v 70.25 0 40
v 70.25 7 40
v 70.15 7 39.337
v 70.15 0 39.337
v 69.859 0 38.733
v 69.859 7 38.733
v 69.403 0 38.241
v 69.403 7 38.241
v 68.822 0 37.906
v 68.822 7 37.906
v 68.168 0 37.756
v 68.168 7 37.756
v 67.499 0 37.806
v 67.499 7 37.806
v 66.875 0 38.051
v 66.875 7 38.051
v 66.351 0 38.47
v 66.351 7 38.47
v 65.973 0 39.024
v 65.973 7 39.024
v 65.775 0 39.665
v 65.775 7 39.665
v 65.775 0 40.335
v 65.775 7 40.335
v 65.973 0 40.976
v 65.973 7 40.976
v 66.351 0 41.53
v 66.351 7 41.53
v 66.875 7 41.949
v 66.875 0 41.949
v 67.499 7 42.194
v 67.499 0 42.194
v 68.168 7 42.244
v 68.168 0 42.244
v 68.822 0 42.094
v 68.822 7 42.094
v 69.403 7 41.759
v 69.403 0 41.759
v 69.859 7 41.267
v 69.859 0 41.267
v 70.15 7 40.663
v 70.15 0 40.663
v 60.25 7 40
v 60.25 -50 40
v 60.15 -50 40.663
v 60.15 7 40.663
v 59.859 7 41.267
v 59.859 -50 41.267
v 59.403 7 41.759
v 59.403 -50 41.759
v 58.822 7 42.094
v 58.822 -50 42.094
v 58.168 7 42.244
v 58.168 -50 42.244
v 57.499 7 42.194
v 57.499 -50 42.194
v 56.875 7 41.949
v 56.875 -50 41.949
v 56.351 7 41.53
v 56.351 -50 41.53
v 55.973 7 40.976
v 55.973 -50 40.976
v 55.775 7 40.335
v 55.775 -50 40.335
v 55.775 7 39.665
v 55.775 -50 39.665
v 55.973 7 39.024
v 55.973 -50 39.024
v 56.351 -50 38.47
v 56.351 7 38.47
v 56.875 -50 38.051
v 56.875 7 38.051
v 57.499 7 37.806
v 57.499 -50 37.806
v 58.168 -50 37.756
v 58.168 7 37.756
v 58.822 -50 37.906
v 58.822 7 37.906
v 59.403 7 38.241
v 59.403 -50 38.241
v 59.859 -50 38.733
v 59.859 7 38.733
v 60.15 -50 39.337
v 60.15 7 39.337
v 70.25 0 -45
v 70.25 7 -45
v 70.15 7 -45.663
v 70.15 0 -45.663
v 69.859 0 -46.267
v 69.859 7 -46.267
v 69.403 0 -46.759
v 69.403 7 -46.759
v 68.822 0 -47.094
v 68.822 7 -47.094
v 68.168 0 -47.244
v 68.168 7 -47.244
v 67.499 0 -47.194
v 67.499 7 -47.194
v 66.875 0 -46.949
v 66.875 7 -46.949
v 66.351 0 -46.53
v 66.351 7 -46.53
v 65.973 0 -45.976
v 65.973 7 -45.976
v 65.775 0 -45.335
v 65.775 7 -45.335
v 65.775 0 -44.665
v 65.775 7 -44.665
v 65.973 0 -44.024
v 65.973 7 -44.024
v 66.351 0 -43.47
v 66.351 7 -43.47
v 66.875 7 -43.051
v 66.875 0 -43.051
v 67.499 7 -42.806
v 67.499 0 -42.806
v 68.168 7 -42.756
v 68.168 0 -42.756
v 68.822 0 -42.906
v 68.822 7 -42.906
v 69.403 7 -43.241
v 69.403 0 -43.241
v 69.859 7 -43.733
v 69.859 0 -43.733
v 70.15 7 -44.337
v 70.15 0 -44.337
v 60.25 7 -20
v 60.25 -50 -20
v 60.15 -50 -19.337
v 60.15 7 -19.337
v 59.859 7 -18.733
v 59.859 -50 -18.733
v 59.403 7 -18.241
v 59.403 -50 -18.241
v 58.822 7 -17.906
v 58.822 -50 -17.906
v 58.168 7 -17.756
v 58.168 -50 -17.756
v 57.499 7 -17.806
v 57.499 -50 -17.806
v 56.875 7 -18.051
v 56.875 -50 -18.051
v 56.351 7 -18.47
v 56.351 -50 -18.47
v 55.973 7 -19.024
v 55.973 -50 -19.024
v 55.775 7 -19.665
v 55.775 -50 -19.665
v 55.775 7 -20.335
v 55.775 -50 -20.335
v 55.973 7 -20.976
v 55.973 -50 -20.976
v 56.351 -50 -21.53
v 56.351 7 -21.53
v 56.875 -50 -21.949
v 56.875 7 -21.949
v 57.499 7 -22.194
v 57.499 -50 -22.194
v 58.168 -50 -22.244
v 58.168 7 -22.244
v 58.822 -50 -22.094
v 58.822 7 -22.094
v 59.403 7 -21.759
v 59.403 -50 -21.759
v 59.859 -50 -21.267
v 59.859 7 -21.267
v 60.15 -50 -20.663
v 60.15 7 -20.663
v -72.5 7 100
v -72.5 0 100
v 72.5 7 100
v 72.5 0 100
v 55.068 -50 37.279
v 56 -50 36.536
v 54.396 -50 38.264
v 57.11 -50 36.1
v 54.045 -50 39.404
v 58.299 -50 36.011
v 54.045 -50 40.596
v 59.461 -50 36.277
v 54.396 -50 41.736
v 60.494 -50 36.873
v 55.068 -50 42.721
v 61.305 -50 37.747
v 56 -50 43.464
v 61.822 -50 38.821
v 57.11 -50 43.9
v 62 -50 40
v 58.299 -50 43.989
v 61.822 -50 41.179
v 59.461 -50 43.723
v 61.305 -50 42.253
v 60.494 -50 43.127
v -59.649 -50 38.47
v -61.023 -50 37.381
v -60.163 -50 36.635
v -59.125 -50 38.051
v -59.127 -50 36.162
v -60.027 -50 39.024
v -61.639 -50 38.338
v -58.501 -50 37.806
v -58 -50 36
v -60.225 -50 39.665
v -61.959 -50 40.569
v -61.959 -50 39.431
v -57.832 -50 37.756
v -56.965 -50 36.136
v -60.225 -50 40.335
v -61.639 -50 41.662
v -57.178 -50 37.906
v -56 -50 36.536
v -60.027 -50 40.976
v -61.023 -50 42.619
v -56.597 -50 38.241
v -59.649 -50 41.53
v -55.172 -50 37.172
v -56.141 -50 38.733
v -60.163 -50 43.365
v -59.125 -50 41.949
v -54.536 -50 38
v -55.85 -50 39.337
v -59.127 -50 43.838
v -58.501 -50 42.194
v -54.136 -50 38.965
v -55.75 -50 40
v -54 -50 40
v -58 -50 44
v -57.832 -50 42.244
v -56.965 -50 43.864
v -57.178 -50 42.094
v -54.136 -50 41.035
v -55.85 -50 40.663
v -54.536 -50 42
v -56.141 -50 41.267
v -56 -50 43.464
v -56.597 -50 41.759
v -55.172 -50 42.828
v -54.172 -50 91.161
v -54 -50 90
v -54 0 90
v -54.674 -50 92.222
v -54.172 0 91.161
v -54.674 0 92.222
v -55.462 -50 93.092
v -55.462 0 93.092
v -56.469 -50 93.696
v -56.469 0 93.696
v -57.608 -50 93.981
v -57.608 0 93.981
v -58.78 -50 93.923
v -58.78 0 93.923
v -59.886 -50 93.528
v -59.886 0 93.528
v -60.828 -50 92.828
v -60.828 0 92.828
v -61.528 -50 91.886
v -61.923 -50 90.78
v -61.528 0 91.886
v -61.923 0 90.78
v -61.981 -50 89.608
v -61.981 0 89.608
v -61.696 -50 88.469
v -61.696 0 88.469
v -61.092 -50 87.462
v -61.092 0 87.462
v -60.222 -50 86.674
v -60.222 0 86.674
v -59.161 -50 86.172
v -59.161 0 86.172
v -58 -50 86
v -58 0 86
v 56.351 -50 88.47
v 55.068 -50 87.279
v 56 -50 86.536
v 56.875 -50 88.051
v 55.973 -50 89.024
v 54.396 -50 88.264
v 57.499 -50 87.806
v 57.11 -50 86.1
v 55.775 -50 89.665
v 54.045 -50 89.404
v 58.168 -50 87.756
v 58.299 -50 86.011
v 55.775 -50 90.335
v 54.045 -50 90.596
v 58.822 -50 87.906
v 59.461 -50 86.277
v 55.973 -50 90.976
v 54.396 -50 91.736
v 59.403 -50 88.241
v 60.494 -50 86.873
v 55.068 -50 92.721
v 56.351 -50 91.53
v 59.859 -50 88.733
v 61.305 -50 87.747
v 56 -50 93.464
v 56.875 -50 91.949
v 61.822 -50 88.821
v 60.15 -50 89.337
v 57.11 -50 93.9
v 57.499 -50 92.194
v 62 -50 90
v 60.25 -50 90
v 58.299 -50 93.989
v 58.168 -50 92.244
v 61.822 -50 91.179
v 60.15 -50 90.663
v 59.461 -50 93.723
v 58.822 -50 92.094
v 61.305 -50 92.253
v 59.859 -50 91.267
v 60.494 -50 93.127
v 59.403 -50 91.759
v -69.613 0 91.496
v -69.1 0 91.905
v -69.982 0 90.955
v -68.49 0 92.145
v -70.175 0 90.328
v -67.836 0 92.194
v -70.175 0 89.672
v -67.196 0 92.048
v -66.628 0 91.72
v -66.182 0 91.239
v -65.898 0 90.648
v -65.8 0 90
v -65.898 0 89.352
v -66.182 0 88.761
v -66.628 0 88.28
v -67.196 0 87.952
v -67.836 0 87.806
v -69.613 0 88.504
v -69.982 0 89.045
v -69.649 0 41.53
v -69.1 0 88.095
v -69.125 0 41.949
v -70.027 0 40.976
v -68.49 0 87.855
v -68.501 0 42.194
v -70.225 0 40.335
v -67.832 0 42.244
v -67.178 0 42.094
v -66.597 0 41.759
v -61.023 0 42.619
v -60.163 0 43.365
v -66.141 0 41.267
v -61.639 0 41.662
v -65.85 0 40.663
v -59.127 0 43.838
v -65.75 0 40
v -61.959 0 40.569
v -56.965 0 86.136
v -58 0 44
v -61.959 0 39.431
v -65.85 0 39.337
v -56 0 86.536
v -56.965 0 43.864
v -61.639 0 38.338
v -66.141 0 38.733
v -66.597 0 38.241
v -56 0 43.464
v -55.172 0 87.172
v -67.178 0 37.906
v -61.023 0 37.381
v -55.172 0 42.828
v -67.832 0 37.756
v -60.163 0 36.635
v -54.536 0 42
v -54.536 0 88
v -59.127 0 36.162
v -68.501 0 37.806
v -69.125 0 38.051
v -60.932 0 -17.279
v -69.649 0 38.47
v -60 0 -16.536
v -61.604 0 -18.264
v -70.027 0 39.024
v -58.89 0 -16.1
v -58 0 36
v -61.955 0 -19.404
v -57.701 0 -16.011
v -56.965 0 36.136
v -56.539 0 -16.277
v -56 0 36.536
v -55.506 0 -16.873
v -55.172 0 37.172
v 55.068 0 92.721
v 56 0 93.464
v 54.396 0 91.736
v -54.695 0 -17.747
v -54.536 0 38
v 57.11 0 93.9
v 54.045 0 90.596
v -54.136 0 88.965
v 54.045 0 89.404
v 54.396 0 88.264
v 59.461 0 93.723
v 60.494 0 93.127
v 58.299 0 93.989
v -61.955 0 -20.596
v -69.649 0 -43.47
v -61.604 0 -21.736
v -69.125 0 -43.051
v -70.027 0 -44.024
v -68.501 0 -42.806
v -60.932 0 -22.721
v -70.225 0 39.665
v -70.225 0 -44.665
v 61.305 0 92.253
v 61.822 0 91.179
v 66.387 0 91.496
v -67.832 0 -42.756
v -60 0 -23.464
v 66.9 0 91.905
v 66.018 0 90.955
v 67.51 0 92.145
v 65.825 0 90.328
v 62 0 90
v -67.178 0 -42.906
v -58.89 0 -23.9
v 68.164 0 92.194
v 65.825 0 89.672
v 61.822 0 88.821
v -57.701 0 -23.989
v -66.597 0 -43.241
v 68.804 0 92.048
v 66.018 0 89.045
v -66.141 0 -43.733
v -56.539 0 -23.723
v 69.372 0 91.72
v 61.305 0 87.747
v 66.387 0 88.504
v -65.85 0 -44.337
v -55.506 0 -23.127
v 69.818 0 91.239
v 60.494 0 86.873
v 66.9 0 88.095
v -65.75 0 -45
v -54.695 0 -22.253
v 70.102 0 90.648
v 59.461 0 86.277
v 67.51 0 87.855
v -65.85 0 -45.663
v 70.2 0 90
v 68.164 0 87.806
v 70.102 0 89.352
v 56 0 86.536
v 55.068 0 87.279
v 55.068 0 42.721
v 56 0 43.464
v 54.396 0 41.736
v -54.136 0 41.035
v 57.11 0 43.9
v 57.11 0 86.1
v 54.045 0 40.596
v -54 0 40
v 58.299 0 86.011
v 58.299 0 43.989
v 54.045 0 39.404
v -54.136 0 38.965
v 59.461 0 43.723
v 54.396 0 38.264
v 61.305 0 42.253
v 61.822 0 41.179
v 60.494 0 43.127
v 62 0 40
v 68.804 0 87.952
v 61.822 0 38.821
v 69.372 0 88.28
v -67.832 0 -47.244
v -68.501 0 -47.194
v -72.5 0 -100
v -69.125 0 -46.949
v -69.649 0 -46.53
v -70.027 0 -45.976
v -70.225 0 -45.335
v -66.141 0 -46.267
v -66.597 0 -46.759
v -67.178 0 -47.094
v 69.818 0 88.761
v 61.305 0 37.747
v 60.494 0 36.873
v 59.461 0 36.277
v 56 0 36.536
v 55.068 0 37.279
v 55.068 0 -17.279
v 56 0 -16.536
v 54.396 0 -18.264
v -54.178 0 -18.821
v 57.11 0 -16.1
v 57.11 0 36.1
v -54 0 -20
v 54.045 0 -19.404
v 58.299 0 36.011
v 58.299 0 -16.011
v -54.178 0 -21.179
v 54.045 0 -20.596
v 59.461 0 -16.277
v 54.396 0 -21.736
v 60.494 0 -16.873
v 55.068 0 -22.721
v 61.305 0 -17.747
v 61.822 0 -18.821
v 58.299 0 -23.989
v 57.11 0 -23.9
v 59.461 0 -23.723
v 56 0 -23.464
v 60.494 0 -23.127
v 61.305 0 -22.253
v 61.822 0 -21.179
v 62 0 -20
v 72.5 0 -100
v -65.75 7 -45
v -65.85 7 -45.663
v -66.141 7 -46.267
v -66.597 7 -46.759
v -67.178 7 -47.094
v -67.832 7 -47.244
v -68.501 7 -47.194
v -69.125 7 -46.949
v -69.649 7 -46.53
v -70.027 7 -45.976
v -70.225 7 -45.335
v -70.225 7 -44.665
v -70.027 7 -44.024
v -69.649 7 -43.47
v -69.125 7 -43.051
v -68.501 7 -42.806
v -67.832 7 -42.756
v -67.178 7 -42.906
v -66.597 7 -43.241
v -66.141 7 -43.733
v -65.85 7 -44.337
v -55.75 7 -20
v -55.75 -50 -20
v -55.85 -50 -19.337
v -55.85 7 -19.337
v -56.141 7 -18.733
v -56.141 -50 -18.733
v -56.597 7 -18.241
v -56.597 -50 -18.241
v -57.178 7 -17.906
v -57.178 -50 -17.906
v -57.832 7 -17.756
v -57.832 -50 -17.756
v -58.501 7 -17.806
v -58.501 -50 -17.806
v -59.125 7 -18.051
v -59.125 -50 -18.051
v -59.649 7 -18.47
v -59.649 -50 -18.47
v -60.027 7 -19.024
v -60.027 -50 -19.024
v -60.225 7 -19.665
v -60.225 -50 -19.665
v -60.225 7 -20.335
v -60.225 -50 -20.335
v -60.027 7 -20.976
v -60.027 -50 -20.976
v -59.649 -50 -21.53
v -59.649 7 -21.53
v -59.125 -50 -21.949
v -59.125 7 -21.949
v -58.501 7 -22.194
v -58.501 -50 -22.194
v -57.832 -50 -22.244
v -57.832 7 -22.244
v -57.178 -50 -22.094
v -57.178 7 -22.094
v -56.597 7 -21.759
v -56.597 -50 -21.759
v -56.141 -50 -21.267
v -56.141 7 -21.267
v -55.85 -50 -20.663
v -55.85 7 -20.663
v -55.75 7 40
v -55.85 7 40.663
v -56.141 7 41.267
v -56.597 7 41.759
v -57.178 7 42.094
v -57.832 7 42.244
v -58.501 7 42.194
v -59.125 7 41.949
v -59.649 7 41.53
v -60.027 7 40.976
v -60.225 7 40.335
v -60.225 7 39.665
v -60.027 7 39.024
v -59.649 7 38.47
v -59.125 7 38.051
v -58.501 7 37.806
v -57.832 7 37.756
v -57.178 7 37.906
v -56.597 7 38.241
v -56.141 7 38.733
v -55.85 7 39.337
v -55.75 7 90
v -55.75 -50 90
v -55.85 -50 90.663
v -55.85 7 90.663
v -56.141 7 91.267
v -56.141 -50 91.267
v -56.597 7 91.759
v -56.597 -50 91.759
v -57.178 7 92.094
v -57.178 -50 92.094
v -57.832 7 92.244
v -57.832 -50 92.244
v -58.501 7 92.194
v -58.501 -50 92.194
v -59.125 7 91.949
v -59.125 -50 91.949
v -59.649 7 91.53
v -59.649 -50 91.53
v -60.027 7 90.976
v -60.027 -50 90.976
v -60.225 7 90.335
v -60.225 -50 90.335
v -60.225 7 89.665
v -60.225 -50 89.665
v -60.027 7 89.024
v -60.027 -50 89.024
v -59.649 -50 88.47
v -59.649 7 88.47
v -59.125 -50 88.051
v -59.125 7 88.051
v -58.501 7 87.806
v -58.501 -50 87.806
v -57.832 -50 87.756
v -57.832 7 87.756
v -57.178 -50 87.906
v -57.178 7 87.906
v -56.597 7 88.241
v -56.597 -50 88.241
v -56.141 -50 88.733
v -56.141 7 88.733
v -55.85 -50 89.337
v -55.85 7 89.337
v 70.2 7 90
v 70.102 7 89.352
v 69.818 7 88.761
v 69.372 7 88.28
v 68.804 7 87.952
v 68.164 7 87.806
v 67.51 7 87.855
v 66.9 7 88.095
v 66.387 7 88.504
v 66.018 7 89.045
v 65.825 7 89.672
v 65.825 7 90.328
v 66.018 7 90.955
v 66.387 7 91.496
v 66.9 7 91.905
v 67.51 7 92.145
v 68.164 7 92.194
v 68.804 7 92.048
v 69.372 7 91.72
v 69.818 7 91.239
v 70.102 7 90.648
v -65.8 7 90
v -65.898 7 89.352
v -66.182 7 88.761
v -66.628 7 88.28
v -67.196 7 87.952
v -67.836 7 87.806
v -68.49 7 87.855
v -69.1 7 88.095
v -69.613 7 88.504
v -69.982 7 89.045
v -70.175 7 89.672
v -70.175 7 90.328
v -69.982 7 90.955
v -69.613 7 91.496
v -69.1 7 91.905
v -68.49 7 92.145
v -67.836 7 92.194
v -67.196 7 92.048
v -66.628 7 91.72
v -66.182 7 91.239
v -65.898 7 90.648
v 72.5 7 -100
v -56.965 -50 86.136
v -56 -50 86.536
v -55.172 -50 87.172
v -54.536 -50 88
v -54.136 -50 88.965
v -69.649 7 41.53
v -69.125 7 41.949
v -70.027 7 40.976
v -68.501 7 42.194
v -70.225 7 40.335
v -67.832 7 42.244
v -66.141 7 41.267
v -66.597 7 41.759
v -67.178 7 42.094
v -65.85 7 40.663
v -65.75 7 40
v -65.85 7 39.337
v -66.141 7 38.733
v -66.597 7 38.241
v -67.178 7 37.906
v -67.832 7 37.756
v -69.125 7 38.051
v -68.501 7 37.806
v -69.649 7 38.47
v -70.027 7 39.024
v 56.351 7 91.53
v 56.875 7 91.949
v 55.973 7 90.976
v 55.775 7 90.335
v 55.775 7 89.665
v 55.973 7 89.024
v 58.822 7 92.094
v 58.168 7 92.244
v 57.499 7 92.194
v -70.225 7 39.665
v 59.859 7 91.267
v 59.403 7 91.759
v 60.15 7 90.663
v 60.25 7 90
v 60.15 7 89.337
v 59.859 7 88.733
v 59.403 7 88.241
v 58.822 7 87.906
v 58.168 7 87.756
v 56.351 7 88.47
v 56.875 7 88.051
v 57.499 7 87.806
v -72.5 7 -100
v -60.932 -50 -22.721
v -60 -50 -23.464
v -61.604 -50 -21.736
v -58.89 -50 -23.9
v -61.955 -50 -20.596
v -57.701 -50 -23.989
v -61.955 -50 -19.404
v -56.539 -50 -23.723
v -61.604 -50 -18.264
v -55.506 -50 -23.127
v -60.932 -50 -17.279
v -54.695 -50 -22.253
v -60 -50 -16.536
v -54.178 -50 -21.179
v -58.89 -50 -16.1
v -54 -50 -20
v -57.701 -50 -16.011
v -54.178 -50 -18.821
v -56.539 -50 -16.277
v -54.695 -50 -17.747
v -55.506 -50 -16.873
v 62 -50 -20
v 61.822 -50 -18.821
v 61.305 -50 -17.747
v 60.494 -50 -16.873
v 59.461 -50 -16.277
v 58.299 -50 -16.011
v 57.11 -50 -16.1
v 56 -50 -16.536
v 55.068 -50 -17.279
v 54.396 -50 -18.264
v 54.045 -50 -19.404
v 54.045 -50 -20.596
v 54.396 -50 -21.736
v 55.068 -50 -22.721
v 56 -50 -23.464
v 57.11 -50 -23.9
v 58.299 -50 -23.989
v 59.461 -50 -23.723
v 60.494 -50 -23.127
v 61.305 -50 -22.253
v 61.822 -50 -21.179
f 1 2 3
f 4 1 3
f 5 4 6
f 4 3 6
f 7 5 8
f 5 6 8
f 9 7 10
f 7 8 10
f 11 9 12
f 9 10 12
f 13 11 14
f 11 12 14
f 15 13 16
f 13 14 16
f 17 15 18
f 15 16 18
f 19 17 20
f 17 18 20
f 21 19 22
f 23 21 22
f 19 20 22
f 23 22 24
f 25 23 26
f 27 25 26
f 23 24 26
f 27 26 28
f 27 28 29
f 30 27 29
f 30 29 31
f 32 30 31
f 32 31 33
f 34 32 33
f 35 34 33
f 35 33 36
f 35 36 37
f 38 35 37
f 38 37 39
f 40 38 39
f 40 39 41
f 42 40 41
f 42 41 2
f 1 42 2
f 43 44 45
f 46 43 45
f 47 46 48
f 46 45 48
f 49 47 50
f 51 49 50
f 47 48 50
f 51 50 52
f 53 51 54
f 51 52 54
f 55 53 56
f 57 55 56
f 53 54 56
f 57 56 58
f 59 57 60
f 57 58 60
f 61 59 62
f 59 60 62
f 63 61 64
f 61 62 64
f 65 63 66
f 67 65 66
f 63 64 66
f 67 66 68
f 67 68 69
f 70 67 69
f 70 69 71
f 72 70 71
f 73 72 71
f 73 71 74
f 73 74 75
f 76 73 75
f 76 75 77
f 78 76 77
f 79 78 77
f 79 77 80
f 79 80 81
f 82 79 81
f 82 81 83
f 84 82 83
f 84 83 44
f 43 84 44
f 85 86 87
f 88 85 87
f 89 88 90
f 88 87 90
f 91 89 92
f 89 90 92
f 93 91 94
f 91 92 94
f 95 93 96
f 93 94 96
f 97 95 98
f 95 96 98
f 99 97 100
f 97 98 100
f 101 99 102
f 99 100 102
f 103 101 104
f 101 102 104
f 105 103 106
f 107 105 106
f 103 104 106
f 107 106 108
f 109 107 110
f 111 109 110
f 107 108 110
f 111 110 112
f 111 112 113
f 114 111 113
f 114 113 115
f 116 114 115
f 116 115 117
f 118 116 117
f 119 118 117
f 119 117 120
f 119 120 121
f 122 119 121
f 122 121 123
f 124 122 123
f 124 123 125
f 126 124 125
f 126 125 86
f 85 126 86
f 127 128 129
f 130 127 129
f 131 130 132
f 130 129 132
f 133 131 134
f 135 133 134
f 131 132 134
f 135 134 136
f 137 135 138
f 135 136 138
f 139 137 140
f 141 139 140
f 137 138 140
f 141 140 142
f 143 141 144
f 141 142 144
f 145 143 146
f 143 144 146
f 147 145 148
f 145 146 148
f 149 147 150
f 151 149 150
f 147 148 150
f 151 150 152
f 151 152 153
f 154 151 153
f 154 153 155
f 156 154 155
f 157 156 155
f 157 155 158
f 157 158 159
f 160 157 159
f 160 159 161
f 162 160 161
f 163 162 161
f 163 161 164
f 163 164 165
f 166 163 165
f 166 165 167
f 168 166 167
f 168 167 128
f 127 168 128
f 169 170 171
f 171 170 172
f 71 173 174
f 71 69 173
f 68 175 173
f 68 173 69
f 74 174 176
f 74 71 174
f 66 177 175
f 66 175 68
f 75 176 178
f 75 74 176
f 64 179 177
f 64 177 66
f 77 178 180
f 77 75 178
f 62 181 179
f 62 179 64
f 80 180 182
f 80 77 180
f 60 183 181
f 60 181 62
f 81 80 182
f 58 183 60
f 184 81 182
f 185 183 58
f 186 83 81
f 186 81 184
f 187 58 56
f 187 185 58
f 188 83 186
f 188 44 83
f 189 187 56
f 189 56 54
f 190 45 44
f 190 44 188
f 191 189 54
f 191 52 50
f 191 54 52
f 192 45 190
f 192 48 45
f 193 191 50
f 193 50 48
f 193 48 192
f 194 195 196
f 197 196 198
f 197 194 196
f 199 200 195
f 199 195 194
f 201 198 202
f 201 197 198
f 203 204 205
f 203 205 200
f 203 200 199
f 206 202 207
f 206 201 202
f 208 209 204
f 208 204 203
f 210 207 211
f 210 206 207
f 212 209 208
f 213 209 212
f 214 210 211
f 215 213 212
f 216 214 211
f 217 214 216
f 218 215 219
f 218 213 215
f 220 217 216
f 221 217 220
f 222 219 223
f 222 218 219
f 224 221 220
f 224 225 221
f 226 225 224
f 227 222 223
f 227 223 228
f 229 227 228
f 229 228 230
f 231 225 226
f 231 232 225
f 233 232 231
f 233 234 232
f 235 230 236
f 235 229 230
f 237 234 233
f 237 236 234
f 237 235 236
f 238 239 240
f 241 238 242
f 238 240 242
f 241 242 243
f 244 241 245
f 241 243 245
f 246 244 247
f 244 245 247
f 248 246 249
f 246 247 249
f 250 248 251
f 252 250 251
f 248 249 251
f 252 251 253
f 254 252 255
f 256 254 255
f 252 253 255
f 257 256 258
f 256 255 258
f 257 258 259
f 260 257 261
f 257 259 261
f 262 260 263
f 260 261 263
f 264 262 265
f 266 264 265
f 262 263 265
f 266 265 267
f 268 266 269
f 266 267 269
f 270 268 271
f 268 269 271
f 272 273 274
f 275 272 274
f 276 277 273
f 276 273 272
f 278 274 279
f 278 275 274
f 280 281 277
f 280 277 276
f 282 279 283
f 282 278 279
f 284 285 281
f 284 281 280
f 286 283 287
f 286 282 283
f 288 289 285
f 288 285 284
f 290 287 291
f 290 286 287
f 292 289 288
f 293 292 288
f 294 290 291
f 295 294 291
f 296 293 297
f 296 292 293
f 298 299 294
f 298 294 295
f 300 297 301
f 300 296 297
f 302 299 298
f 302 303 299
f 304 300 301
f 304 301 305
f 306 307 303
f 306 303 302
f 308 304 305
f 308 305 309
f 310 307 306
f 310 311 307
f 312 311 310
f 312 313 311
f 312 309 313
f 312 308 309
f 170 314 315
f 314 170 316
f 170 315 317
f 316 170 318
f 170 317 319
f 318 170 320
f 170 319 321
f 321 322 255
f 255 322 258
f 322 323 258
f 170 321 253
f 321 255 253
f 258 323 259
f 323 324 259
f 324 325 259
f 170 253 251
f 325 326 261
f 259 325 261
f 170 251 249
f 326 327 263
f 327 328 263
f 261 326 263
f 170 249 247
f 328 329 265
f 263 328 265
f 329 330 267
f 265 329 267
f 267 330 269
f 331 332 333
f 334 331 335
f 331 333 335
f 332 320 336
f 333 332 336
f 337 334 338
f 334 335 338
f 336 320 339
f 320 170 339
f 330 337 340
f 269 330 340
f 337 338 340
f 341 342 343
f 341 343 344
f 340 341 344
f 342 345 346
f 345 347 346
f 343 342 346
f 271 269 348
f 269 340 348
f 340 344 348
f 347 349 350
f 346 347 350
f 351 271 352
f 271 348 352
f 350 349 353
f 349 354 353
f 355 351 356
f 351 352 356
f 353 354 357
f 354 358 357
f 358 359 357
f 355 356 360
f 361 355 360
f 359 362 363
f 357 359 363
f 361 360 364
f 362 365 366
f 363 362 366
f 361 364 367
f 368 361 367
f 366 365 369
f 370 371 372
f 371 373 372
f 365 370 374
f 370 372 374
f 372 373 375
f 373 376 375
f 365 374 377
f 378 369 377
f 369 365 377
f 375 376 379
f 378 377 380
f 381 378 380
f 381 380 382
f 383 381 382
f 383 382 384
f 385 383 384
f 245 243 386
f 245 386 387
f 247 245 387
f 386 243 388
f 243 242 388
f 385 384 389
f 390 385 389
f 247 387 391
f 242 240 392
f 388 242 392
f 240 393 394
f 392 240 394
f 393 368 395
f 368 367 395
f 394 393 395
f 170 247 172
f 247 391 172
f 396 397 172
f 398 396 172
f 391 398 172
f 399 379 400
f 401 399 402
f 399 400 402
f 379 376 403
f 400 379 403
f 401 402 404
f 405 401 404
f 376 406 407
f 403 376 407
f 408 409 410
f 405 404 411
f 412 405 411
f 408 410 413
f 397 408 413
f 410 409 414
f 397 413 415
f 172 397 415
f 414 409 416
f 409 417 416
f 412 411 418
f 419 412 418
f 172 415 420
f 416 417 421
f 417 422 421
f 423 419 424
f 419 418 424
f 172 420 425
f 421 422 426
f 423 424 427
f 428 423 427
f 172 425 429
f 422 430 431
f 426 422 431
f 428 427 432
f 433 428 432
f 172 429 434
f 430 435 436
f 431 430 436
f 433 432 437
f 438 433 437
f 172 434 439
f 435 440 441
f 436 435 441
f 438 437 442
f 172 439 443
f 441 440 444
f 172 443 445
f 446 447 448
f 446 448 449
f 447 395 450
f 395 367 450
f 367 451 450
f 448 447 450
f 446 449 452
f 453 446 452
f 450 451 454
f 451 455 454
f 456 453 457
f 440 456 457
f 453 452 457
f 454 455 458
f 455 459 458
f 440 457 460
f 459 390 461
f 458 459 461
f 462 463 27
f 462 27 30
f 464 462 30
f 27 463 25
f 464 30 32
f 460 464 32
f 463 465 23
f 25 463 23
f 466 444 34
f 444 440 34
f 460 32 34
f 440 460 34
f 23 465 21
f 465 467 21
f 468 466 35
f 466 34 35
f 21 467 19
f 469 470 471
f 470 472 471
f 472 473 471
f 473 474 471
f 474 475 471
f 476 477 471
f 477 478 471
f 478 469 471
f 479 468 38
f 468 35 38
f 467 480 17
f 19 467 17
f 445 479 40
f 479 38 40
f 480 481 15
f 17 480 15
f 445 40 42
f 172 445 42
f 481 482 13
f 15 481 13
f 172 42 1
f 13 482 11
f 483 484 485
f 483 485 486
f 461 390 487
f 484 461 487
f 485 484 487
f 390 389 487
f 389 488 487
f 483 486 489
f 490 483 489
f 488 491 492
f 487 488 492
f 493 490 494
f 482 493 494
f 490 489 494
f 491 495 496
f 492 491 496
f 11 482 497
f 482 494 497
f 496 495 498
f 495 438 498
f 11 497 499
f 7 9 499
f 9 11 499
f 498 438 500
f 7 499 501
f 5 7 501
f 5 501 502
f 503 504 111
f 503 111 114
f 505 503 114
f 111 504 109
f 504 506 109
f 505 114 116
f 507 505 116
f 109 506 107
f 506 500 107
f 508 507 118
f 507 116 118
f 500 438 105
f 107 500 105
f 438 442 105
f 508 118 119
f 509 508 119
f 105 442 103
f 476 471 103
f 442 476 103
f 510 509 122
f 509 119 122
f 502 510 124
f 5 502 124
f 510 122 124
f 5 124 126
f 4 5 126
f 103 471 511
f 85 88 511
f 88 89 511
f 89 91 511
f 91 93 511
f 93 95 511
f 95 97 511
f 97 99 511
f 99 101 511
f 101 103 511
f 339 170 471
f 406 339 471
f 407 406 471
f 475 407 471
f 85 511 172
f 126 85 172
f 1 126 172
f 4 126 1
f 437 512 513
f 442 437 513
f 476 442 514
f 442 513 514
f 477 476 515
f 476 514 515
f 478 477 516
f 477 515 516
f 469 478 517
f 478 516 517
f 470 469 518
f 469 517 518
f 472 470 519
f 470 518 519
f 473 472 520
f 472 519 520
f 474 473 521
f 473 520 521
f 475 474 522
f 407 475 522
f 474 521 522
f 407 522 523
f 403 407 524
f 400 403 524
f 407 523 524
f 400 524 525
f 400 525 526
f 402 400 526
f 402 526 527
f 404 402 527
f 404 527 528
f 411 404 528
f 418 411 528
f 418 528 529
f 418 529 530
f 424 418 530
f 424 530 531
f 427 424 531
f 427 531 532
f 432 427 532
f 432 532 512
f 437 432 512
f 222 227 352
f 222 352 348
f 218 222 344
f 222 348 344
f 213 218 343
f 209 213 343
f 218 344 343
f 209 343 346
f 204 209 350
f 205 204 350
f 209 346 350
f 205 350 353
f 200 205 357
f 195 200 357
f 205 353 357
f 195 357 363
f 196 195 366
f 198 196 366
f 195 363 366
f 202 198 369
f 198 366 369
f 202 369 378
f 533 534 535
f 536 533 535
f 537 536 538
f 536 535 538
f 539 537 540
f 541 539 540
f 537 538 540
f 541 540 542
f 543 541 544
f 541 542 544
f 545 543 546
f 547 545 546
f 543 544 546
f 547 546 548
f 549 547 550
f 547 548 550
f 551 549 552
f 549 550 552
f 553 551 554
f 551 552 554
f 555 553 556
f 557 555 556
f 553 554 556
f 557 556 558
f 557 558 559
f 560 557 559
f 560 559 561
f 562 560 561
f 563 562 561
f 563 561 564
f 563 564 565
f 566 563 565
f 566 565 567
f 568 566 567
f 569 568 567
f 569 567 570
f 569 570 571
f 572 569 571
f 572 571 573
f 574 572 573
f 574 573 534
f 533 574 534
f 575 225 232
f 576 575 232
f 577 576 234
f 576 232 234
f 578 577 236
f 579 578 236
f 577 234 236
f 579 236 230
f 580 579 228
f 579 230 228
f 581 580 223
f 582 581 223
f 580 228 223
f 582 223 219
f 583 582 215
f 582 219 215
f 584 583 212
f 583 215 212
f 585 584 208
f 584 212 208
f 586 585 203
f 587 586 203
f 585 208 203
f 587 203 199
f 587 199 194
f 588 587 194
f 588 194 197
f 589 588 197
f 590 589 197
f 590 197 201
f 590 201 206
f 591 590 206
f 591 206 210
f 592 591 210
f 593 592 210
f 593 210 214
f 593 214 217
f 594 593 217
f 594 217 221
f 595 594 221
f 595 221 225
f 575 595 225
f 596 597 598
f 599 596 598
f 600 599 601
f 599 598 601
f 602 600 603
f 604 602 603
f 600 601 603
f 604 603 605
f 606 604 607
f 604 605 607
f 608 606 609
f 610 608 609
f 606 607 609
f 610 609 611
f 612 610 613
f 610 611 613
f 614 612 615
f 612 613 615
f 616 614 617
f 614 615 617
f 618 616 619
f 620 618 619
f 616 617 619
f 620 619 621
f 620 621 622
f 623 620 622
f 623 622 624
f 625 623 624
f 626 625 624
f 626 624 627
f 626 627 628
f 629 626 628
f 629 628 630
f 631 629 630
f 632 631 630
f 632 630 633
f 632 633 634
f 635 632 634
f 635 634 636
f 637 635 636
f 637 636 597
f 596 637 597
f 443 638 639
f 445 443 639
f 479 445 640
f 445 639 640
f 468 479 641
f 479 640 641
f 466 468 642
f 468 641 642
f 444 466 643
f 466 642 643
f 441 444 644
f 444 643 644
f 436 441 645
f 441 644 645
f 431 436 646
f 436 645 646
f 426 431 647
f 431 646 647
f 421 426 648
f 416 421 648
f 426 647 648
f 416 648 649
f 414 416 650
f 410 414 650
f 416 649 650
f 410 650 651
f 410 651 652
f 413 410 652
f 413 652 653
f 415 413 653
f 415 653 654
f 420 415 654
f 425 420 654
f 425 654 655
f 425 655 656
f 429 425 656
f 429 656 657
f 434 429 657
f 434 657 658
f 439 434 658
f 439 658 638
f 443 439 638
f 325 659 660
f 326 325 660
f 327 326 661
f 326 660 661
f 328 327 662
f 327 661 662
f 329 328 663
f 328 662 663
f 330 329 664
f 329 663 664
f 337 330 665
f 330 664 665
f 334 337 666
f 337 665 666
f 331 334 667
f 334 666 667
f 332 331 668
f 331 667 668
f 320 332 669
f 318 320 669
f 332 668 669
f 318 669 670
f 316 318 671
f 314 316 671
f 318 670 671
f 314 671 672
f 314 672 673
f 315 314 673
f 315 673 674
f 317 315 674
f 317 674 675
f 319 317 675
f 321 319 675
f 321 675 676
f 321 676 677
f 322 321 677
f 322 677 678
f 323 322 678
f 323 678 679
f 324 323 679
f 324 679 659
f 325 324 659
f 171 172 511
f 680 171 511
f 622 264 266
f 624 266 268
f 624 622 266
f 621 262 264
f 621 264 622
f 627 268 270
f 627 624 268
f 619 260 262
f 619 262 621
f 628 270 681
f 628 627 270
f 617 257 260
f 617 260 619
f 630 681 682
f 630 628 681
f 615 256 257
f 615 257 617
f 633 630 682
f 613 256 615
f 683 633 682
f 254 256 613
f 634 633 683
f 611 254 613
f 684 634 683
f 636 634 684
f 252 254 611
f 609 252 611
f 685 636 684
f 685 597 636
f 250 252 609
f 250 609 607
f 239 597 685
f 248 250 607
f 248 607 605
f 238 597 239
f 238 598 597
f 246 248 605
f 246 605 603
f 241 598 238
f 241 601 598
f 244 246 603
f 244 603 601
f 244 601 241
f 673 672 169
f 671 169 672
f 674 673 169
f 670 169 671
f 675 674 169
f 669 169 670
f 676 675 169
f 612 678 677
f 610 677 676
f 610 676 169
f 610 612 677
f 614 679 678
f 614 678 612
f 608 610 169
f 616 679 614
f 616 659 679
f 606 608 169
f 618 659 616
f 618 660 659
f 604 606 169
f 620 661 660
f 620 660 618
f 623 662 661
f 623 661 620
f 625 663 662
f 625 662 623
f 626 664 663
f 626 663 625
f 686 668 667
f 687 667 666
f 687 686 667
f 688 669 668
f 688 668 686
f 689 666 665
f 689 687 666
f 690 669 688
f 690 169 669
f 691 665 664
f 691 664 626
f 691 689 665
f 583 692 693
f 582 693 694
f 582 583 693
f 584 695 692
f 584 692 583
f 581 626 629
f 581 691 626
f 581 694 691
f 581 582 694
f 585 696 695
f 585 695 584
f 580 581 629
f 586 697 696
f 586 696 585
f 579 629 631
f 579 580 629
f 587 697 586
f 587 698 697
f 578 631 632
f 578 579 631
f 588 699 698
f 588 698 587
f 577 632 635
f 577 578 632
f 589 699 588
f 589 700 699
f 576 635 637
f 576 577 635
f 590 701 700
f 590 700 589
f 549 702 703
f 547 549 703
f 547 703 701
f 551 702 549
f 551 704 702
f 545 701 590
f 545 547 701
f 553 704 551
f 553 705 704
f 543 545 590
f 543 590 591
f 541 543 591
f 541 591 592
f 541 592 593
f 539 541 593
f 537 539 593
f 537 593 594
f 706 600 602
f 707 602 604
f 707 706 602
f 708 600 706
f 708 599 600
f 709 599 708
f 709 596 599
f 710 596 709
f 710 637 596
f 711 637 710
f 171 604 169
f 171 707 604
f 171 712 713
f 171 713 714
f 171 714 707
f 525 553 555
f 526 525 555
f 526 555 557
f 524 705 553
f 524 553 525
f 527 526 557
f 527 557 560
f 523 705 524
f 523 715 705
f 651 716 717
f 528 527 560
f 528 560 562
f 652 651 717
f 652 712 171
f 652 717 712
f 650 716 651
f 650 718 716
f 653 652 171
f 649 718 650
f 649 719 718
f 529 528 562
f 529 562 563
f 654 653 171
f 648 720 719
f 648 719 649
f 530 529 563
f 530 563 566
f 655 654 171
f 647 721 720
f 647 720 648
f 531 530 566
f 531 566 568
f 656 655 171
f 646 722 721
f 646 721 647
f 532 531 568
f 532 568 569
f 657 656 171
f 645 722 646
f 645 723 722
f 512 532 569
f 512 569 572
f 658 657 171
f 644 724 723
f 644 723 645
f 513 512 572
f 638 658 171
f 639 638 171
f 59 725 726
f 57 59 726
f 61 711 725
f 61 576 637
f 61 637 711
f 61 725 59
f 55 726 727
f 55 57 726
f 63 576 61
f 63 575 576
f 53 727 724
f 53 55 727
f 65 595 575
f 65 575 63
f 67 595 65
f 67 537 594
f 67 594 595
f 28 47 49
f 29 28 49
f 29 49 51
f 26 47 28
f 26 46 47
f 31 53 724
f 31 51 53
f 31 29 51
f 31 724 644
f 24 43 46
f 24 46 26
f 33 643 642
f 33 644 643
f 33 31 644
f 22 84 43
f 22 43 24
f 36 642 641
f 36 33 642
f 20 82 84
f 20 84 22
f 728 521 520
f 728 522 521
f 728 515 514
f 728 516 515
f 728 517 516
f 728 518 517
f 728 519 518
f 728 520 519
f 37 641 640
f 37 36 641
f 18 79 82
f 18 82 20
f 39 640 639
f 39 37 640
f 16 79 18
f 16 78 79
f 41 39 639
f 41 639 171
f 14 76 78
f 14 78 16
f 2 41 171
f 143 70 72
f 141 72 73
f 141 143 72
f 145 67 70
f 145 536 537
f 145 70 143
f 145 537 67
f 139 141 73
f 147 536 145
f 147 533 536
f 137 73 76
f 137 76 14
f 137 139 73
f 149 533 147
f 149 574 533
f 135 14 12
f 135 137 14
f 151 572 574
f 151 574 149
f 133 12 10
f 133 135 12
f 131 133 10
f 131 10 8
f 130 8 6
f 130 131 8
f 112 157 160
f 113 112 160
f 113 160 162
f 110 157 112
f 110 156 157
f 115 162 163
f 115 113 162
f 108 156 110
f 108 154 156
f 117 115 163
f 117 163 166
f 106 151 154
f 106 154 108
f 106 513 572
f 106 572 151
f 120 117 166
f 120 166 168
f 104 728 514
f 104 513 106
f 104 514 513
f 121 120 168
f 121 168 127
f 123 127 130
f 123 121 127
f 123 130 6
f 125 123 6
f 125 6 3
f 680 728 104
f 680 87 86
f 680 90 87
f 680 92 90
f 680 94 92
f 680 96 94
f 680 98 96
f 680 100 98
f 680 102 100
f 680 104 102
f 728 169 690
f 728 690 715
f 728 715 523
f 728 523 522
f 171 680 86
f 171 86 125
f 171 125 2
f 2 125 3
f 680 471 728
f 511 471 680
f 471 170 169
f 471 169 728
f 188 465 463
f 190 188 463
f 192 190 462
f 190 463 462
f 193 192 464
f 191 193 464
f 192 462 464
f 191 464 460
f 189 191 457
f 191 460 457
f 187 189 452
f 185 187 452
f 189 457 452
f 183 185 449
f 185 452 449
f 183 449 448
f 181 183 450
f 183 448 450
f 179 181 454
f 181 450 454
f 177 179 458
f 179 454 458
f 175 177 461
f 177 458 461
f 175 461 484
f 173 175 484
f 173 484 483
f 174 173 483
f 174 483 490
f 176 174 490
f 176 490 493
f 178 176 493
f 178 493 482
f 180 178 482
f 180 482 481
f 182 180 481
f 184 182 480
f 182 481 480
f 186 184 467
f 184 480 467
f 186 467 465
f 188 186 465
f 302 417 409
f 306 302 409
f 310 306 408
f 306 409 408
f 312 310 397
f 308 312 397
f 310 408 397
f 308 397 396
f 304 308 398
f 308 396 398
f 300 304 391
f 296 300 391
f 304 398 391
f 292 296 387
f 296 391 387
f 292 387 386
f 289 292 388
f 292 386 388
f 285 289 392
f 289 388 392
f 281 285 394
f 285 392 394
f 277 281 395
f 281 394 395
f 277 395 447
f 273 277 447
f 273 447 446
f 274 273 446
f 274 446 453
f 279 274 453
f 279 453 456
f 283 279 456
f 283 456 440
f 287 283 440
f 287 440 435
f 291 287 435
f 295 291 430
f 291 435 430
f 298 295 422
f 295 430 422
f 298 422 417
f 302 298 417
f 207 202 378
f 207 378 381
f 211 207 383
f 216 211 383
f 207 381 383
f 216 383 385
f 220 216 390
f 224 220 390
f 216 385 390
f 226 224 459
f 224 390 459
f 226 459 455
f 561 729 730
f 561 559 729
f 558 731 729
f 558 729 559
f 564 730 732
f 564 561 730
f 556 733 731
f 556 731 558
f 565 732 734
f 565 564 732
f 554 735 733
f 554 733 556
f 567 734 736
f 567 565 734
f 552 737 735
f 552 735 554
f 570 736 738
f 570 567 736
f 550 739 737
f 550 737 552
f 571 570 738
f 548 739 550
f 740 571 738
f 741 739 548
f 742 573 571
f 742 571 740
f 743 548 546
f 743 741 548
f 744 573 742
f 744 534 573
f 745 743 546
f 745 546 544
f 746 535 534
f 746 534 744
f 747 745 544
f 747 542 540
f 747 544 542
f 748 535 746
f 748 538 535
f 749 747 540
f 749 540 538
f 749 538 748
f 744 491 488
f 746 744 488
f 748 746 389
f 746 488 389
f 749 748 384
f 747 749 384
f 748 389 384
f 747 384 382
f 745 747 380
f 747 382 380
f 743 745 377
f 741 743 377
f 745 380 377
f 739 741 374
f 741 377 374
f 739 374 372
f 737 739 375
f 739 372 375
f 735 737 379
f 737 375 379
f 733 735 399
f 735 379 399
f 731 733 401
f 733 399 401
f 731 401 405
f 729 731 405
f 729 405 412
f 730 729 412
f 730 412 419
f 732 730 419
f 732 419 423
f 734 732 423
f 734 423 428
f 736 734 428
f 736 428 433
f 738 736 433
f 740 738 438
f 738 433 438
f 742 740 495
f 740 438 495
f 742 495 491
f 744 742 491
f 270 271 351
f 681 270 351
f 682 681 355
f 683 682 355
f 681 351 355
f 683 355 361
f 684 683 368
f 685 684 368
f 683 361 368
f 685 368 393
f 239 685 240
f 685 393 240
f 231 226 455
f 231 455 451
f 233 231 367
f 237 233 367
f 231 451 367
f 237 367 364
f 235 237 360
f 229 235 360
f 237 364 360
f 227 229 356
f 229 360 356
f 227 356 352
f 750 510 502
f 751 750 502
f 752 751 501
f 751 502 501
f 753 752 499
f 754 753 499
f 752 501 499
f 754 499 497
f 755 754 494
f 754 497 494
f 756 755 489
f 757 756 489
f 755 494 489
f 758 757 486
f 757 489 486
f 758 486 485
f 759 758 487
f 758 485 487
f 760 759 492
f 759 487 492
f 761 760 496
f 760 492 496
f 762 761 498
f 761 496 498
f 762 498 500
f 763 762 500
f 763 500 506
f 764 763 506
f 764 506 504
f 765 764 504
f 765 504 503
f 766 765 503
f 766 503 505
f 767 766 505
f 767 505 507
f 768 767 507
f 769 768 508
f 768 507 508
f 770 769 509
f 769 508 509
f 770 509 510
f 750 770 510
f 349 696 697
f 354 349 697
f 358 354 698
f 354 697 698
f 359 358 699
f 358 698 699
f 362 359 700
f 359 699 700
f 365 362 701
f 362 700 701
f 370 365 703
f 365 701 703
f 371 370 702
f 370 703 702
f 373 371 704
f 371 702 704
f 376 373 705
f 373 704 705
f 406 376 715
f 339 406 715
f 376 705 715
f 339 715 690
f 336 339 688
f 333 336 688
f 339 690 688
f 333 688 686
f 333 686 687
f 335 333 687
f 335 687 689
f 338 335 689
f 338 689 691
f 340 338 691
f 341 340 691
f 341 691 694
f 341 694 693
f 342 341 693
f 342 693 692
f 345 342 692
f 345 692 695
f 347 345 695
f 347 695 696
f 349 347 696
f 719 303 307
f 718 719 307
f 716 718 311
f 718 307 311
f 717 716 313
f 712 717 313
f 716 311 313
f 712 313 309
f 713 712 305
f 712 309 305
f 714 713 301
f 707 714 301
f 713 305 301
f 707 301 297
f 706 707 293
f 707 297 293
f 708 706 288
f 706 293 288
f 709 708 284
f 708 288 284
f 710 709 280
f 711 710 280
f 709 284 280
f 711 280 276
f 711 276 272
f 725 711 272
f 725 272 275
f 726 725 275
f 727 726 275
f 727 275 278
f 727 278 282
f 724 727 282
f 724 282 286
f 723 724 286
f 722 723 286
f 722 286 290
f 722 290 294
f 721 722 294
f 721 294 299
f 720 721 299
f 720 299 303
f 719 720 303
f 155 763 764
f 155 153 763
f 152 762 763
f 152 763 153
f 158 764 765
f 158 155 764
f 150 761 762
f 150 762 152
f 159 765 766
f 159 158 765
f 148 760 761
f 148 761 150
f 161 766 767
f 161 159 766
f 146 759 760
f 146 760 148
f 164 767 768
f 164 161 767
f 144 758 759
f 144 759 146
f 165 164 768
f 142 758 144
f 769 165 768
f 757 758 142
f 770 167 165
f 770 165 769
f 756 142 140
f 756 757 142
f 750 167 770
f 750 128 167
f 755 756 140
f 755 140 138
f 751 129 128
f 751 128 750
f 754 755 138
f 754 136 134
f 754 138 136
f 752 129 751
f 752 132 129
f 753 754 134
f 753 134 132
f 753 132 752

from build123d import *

# Parameters (mm, degrees)
SKETCH2_W           = 145
SKETCH2_H           = 200
BOSS_EXTRUDE1_DEPTH = 7
SKETCH5_R           = 2.25
SKETCH5_R_2         = 2.2
CUT_EXTRUDE1_DEPTH  = 33
SKETCH6_R           = 4
BOSS_EXTRUDE3_DEPTH = 50
SKETCH7_R           = 2.25
CUT_EXTRUDE2_DEPTH  = 58


with BuildPart() as part:
    # Sketch2 → Boss-Extrude1 (new body)
    with BuildSketch(Plane(origin=(0, 0, 0), x_dir=(1, 0, 0), z_dir=(0, 1, 0))):
        Rectangle(SKETCH2_W, SKETCH2_H)
    extrude(amount=BOSS_EXTRUDE1_DEPTH)

    # Sketch5 → Cut-Extrude1 (cut, through all)
    with BuildSketch(Plane(origin=(0, 32, 0), x_dir=(1, 0, 0), z_dir=(0, 1, 0))):
        with Locations((-68, 45)):
            Circle(SKETCH5_R)
        with Locations((-68, -40)):
            Circle(SKETCH5_R)
        with Locations((-68, -90)):
            Circle(SKETCH5_R_2)
        with Locations((68, -90)):
            Circle(SKETCH5_R_2)
        with Locations((68, -40)):
            Circle(SKETCH5_R)
        with Locations((68, 45)):
            Circle(SKETCH5_R)
    extrude(amount=-CUT_EXTRUDE1_DEPTH, mode=Mode.SUBTRACT)

    # Sketch6 → Boss-Extrude3 (add)
    with BuildSketch(Plane.XZ):
        with BuildLine():
            ThreePointArc((-58, 44), (-62, 40), (-58, 36))
            Line((-58, 36), (-58, 44))
        make_face()
        with BuildLine():
            Line((-58, 44), (-58, 36))
            ThreePointArc((-58, 36), (-55.171572875, 37.171572875), (-54, 40))
            ThreePointArc((-54, 40), (-55.171572875, 42.828427125), (-58, 44))
        make_face()
        with BuildLine():
            ThreePointArc((-54, 90), (-60.828427125, 92.828427125), (-58, 86))
            Line((-58, 86), (-58, 90))
            Line((-58, 90), (-54, 90))
        make_face()
        with BuildLine():
            Line((-58, 90), (-58, 86))
            ThreePointArc((-58, 86), (-55.171572875, 87.171572875), (-54, 90))
            Line((-54, 90), (-58, 90))
        make_face()
        with Locations((58, 90)):
            Circle(SKETCH6_R)
        with Locations((-58, -20)):
            Circle(SKETCH6_R)
        with Locations((58, -20)):
            Circle(SKETCH6_R)
        with Locations((58, 40)):
            Circle(SKETCH6_R)
    extrude(amount=BOSS_EXTRUDE3_DEPTH)

    # Sketch7 → Cut-Extrude2 (cut, through all)
    with BuildSketch(Plane.XZ.offset(50)):
        with Locations((-58, 90)):
            Circle(SKETCH7_R)
        with Locations((-58, 40)):
            Circle(SKETCH7_R)
        with Locations((-58, -20)):
            Circle(SKETCH7_R)
        with Locations((58, -20)):
            Circle(SKETCH7_R)
        with Locations((58, 40)):
            Circle(SKETCH7_R)
        with Locations((58, 90)):
            Circle(SKETCH7_R)
    extrude(amount=-CUT_EXTRUDE2_DEPTH, mode=Mode.SUBTRACT)


solid = part.part
